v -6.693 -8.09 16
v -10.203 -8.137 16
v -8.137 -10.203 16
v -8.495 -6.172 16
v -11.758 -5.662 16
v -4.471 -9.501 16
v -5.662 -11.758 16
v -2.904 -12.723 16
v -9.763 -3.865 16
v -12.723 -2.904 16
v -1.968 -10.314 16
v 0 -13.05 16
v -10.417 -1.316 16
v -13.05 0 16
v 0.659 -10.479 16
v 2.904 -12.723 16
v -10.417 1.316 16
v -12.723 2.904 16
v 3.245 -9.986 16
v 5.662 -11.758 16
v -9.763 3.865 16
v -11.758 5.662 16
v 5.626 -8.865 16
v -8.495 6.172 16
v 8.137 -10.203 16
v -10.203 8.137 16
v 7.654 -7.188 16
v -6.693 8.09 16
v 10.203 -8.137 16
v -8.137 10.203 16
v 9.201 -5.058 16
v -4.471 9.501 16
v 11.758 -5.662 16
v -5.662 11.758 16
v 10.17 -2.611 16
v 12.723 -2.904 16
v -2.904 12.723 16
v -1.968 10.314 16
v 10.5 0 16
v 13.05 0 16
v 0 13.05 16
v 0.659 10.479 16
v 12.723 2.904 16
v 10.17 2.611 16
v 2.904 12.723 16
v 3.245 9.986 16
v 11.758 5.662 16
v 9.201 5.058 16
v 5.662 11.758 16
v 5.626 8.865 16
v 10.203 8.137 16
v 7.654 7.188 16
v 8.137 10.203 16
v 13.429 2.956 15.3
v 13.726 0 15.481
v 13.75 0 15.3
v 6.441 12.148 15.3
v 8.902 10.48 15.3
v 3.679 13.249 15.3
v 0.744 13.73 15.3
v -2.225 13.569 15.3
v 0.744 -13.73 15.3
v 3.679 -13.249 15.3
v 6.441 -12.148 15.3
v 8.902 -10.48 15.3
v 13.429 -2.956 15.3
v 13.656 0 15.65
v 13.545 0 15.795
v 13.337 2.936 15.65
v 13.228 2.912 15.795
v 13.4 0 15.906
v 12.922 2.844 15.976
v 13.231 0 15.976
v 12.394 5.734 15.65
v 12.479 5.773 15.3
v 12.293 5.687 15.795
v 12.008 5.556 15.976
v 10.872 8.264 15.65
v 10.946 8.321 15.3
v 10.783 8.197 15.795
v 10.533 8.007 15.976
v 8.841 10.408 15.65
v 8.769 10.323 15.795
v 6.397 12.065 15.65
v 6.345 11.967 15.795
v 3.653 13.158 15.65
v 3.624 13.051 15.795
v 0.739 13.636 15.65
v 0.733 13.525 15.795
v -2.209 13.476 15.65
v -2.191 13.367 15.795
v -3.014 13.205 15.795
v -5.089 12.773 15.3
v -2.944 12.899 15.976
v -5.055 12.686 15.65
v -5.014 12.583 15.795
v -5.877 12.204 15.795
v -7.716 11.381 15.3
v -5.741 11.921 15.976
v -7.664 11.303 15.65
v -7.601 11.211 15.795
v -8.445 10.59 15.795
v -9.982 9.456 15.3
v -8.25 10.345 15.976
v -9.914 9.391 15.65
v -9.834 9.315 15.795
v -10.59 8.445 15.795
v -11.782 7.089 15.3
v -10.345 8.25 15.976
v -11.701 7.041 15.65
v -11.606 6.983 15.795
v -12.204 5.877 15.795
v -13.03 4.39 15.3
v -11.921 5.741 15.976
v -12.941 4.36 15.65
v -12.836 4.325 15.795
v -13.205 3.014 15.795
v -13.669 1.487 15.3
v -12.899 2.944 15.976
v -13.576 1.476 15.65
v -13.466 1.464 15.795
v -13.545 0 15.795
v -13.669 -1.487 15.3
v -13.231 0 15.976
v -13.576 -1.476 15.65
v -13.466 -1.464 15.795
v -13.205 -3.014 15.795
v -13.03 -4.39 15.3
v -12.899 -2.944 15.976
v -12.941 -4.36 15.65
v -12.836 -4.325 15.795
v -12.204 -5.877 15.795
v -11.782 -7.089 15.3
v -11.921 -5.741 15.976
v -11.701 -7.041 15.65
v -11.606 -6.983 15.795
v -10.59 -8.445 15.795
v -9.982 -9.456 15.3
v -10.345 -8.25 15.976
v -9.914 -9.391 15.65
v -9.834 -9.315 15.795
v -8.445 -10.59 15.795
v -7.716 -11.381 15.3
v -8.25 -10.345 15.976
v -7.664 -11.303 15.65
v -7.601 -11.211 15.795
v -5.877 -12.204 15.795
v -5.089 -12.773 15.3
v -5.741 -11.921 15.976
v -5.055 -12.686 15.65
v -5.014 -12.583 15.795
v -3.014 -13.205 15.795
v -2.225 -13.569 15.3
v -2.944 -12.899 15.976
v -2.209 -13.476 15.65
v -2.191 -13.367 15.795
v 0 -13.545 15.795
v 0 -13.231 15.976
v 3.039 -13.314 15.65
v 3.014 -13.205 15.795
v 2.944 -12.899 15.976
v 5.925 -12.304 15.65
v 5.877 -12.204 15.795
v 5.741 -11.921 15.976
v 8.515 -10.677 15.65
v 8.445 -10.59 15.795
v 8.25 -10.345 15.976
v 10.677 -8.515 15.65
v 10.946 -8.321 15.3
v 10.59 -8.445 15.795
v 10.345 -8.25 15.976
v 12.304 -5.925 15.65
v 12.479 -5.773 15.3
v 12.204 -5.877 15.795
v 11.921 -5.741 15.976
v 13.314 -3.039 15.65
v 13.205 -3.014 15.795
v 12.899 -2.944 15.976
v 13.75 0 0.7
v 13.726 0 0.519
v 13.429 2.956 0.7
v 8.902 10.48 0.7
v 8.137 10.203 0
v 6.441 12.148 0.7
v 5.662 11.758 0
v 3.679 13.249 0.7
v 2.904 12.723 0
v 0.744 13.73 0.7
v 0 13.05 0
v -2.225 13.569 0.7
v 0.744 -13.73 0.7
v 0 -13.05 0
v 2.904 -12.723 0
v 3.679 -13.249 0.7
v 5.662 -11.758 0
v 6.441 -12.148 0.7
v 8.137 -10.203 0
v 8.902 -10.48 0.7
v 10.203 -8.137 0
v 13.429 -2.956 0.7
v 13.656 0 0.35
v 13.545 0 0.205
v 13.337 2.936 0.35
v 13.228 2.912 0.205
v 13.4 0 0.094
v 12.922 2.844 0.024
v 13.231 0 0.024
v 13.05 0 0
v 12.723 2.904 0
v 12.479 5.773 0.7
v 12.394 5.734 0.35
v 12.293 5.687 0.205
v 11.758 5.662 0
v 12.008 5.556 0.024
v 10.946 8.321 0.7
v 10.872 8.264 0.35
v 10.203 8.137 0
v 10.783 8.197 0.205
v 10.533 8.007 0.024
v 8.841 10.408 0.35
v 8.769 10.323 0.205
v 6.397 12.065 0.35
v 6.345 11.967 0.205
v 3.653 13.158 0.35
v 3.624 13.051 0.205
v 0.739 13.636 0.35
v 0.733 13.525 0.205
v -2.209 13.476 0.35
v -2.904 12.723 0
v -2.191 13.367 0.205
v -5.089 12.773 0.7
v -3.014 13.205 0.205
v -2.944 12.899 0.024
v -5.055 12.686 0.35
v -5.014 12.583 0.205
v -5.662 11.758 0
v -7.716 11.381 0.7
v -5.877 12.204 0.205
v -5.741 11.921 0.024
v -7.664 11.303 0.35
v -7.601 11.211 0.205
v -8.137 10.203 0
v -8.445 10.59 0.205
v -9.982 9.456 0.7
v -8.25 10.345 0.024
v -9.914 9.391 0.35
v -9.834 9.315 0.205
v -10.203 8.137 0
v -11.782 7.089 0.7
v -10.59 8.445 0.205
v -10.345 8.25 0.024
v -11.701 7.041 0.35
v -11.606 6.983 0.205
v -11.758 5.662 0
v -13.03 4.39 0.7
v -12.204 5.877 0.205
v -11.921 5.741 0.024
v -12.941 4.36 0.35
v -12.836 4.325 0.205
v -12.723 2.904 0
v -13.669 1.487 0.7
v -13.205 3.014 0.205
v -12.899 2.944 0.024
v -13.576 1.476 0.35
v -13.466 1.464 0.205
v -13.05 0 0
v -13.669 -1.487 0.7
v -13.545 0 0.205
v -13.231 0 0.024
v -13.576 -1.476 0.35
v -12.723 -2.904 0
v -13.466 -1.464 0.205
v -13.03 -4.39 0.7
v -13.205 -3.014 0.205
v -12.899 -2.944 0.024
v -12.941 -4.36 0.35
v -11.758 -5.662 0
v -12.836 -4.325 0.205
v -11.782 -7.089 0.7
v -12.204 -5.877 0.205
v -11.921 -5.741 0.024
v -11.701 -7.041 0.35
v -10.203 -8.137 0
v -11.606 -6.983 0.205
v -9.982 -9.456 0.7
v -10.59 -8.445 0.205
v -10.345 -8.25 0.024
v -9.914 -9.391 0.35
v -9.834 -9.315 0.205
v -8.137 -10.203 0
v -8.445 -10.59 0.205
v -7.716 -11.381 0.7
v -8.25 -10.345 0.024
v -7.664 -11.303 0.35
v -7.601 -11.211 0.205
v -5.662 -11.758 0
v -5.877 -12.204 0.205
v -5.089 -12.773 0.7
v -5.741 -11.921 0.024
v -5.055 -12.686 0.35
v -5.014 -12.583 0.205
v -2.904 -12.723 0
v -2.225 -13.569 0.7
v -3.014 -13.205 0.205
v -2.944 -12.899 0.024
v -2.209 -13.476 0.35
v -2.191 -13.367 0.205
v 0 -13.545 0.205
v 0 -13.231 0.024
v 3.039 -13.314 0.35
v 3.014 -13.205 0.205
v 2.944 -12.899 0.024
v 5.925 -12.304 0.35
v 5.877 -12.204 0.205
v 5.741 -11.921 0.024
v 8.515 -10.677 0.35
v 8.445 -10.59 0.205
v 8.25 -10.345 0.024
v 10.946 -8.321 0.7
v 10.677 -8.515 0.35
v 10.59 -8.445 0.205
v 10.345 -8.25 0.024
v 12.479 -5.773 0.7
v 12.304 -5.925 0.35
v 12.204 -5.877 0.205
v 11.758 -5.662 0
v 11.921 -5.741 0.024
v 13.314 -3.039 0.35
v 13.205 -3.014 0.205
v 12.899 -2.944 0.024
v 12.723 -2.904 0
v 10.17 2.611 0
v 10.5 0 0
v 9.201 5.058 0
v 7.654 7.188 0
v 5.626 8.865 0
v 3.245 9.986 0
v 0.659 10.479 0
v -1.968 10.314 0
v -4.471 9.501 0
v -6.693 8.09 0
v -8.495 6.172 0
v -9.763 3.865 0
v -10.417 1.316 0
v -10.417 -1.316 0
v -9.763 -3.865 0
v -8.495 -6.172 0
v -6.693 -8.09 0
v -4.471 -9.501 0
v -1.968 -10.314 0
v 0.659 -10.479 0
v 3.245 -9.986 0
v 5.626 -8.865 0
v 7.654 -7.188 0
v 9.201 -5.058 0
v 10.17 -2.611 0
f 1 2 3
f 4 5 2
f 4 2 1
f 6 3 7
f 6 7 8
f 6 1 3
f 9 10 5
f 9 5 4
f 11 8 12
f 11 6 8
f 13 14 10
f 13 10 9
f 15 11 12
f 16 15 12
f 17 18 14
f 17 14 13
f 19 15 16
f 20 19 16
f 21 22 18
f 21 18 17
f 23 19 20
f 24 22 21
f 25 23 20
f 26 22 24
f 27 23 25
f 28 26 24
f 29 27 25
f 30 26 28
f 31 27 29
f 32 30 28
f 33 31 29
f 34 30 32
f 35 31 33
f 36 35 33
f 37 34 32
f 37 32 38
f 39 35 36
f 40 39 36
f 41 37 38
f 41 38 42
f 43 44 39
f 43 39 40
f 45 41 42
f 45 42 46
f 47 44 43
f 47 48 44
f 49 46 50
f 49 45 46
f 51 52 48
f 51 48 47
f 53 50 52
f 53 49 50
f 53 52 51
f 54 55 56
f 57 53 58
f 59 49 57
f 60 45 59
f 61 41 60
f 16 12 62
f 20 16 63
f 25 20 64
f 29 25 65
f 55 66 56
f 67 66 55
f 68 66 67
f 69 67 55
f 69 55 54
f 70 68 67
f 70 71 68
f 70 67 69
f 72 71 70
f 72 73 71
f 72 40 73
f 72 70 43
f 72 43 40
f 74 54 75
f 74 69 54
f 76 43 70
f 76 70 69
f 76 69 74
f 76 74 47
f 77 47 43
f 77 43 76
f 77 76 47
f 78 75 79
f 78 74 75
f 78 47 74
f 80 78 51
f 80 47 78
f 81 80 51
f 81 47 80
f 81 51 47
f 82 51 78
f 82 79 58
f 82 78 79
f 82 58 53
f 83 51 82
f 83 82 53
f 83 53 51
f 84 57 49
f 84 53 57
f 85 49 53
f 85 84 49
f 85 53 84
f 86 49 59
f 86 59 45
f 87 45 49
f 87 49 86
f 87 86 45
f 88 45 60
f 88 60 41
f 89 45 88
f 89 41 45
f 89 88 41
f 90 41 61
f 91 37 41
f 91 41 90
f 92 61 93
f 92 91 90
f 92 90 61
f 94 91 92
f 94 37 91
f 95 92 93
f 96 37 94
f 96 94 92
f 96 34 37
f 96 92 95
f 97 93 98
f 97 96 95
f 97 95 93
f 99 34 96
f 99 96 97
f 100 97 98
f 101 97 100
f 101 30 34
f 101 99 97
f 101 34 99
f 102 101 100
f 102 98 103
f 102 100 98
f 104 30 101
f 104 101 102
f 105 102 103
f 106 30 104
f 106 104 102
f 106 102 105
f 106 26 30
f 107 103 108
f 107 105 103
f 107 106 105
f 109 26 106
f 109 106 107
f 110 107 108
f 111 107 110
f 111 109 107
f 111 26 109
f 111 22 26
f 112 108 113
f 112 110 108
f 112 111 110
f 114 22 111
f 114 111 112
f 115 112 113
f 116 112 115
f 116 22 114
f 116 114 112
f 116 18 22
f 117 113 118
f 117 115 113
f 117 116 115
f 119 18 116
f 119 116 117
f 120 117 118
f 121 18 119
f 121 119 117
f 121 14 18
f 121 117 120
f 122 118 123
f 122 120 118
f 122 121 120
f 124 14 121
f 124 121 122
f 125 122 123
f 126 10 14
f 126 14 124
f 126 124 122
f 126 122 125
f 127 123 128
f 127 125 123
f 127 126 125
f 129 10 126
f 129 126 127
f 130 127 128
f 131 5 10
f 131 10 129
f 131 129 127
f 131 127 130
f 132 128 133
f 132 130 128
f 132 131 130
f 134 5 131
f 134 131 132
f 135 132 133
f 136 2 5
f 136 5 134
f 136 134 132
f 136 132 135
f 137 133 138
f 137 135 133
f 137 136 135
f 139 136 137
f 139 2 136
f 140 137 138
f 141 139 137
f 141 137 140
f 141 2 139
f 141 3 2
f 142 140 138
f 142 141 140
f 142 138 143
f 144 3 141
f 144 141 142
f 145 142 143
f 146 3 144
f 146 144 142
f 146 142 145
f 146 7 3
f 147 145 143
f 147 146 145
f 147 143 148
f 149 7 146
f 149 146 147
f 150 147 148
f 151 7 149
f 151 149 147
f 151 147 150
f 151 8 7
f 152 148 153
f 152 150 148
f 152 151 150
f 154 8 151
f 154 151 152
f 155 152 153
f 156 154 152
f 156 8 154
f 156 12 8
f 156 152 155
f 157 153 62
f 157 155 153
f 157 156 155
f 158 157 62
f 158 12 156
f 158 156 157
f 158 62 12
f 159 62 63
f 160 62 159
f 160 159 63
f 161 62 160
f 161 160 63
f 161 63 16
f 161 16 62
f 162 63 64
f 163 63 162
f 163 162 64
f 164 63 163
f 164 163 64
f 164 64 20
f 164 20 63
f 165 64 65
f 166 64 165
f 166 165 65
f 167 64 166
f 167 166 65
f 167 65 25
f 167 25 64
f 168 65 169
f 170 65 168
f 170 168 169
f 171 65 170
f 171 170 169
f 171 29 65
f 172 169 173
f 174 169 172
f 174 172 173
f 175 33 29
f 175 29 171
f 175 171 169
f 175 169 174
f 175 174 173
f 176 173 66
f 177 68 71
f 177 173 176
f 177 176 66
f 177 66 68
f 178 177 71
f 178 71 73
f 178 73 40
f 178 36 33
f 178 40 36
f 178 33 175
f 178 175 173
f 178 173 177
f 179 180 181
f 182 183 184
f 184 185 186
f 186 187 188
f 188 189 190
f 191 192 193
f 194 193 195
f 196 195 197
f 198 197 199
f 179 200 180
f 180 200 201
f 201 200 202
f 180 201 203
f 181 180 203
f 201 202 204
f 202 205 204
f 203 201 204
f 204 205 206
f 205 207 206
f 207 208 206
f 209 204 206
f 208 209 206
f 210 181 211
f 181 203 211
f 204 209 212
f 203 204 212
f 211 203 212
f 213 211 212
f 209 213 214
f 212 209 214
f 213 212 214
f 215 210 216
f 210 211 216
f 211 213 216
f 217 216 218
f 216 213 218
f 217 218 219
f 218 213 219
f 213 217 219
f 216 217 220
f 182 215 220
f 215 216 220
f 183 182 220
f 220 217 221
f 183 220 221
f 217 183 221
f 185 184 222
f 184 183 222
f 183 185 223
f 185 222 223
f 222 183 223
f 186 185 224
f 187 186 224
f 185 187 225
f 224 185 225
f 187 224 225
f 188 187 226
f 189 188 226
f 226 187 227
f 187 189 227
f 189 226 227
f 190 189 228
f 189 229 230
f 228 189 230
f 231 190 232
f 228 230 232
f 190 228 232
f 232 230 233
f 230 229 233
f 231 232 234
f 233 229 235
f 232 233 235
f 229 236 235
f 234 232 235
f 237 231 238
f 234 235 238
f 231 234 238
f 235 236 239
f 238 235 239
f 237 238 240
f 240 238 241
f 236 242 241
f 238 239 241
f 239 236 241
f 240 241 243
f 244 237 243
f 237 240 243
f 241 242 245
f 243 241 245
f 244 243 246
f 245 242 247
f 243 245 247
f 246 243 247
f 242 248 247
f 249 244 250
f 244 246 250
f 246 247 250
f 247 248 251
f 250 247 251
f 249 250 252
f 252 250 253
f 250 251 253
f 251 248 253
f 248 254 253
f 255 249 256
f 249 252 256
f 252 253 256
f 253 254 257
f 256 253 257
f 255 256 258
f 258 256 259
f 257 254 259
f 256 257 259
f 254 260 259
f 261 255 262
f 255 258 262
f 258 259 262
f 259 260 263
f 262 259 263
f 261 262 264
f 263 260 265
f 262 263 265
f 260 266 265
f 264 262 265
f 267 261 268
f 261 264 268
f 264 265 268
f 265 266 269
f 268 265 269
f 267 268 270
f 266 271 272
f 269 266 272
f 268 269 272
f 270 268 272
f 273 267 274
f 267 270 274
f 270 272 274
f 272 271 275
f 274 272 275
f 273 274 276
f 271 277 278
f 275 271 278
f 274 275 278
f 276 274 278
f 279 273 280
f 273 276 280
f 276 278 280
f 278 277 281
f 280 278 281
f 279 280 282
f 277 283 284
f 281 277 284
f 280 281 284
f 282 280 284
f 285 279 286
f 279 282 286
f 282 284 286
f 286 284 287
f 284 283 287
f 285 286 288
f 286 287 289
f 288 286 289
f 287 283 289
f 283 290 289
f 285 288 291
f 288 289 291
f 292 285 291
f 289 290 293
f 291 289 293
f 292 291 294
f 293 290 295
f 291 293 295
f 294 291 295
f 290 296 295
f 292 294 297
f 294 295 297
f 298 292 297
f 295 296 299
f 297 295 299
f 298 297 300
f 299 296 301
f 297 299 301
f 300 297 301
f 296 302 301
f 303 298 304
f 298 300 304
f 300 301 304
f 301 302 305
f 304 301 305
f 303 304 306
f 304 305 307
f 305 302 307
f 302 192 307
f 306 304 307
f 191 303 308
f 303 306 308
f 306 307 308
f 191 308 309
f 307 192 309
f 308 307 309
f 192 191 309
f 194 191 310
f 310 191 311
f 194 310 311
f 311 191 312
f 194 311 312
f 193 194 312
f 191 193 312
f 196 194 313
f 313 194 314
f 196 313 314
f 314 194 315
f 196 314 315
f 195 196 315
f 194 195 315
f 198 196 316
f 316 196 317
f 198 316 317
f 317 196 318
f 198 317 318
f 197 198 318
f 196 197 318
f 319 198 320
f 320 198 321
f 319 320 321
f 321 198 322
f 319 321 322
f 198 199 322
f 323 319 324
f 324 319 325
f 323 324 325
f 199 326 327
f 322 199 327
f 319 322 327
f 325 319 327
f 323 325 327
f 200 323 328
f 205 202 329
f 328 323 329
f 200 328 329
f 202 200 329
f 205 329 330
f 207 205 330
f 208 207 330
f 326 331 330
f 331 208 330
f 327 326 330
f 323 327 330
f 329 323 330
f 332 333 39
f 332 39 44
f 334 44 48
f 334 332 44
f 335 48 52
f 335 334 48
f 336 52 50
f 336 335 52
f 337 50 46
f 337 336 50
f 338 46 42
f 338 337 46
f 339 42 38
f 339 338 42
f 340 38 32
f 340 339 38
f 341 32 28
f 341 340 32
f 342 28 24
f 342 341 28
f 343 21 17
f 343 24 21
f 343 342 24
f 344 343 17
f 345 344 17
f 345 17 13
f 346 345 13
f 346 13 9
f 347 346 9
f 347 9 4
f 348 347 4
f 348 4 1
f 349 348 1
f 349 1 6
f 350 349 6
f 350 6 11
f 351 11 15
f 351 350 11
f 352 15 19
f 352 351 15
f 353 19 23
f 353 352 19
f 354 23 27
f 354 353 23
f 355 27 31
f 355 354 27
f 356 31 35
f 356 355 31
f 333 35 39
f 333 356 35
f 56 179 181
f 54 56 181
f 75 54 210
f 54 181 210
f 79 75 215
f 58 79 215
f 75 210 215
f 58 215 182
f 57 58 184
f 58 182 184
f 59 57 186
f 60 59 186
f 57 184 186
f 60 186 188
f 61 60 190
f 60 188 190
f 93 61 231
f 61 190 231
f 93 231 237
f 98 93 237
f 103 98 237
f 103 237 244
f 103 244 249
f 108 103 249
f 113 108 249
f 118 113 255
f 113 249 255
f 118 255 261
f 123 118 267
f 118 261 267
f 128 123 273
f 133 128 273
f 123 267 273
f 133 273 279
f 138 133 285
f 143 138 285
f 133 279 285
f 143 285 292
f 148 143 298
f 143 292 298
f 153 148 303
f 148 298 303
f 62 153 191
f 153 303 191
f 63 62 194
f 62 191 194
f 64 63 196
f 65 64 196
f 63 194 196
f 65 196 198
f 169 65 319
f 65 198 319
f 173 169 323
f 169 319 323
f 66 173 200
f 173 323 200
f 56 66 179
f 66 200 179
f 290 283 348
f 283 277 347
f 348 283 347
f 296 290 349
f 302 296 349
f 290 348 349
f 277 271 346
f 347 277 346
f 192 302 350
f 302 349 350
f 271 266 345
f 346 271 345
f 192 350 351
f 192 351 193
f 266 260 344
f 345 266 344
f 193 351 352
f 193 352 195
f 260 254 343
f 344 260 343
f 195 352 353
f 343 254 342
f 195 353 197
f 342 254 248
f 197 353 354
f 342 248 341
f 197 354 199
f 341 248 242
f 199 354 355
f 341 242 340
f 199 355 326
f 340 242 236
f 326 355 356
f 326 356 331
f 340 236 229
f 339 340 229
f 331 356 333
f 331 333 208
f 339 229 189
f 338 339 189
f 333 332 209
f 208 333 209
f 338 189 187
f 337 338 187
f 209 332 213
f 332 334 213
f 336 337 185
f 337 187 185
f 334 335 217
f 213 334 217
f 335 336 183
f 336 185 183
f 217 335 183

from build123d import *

# Parameters (mm, degrees)
CYLINDER041_R     = 10.5
CYLINDER041_DEPTH = 20
CYLINDER040_R     = 13.75
CYLINDER040_DEPTH = 16
FILLET013_R       = 0.7


with BuildPart() as cylinder041:
    # Cylinder041 → Cylinder041 (new body)
    with BuildSketch(Plane.XY.offset(-1)):
        Circle(CYLINDER041_R)
    extrude(amount=CYLINDER041_DEPTH)


with BuildPart() as tire_src001:
    # Cylinder040 → Cylinder040 (new body)
    with BuildSketch(Plane.XY):
        Circle(CYLINDER040_R)
    extrude(amount=CYLINDER040_DEPTH)

    # Cut027: cut Cylinder041
    add(cylinder041.part, mode=Mode.SUBTRACT)

    # Fillet013
    fillet013_edges = [tire_src001.edges().sort_by_distance(p)[0] for p in [
        (-13.75, 0, 16),
        (-13.75, 0, 0),
    ]]
    fillet(fillet013_edges, radius=FILLET013_R)


solid = tire_src001.part
